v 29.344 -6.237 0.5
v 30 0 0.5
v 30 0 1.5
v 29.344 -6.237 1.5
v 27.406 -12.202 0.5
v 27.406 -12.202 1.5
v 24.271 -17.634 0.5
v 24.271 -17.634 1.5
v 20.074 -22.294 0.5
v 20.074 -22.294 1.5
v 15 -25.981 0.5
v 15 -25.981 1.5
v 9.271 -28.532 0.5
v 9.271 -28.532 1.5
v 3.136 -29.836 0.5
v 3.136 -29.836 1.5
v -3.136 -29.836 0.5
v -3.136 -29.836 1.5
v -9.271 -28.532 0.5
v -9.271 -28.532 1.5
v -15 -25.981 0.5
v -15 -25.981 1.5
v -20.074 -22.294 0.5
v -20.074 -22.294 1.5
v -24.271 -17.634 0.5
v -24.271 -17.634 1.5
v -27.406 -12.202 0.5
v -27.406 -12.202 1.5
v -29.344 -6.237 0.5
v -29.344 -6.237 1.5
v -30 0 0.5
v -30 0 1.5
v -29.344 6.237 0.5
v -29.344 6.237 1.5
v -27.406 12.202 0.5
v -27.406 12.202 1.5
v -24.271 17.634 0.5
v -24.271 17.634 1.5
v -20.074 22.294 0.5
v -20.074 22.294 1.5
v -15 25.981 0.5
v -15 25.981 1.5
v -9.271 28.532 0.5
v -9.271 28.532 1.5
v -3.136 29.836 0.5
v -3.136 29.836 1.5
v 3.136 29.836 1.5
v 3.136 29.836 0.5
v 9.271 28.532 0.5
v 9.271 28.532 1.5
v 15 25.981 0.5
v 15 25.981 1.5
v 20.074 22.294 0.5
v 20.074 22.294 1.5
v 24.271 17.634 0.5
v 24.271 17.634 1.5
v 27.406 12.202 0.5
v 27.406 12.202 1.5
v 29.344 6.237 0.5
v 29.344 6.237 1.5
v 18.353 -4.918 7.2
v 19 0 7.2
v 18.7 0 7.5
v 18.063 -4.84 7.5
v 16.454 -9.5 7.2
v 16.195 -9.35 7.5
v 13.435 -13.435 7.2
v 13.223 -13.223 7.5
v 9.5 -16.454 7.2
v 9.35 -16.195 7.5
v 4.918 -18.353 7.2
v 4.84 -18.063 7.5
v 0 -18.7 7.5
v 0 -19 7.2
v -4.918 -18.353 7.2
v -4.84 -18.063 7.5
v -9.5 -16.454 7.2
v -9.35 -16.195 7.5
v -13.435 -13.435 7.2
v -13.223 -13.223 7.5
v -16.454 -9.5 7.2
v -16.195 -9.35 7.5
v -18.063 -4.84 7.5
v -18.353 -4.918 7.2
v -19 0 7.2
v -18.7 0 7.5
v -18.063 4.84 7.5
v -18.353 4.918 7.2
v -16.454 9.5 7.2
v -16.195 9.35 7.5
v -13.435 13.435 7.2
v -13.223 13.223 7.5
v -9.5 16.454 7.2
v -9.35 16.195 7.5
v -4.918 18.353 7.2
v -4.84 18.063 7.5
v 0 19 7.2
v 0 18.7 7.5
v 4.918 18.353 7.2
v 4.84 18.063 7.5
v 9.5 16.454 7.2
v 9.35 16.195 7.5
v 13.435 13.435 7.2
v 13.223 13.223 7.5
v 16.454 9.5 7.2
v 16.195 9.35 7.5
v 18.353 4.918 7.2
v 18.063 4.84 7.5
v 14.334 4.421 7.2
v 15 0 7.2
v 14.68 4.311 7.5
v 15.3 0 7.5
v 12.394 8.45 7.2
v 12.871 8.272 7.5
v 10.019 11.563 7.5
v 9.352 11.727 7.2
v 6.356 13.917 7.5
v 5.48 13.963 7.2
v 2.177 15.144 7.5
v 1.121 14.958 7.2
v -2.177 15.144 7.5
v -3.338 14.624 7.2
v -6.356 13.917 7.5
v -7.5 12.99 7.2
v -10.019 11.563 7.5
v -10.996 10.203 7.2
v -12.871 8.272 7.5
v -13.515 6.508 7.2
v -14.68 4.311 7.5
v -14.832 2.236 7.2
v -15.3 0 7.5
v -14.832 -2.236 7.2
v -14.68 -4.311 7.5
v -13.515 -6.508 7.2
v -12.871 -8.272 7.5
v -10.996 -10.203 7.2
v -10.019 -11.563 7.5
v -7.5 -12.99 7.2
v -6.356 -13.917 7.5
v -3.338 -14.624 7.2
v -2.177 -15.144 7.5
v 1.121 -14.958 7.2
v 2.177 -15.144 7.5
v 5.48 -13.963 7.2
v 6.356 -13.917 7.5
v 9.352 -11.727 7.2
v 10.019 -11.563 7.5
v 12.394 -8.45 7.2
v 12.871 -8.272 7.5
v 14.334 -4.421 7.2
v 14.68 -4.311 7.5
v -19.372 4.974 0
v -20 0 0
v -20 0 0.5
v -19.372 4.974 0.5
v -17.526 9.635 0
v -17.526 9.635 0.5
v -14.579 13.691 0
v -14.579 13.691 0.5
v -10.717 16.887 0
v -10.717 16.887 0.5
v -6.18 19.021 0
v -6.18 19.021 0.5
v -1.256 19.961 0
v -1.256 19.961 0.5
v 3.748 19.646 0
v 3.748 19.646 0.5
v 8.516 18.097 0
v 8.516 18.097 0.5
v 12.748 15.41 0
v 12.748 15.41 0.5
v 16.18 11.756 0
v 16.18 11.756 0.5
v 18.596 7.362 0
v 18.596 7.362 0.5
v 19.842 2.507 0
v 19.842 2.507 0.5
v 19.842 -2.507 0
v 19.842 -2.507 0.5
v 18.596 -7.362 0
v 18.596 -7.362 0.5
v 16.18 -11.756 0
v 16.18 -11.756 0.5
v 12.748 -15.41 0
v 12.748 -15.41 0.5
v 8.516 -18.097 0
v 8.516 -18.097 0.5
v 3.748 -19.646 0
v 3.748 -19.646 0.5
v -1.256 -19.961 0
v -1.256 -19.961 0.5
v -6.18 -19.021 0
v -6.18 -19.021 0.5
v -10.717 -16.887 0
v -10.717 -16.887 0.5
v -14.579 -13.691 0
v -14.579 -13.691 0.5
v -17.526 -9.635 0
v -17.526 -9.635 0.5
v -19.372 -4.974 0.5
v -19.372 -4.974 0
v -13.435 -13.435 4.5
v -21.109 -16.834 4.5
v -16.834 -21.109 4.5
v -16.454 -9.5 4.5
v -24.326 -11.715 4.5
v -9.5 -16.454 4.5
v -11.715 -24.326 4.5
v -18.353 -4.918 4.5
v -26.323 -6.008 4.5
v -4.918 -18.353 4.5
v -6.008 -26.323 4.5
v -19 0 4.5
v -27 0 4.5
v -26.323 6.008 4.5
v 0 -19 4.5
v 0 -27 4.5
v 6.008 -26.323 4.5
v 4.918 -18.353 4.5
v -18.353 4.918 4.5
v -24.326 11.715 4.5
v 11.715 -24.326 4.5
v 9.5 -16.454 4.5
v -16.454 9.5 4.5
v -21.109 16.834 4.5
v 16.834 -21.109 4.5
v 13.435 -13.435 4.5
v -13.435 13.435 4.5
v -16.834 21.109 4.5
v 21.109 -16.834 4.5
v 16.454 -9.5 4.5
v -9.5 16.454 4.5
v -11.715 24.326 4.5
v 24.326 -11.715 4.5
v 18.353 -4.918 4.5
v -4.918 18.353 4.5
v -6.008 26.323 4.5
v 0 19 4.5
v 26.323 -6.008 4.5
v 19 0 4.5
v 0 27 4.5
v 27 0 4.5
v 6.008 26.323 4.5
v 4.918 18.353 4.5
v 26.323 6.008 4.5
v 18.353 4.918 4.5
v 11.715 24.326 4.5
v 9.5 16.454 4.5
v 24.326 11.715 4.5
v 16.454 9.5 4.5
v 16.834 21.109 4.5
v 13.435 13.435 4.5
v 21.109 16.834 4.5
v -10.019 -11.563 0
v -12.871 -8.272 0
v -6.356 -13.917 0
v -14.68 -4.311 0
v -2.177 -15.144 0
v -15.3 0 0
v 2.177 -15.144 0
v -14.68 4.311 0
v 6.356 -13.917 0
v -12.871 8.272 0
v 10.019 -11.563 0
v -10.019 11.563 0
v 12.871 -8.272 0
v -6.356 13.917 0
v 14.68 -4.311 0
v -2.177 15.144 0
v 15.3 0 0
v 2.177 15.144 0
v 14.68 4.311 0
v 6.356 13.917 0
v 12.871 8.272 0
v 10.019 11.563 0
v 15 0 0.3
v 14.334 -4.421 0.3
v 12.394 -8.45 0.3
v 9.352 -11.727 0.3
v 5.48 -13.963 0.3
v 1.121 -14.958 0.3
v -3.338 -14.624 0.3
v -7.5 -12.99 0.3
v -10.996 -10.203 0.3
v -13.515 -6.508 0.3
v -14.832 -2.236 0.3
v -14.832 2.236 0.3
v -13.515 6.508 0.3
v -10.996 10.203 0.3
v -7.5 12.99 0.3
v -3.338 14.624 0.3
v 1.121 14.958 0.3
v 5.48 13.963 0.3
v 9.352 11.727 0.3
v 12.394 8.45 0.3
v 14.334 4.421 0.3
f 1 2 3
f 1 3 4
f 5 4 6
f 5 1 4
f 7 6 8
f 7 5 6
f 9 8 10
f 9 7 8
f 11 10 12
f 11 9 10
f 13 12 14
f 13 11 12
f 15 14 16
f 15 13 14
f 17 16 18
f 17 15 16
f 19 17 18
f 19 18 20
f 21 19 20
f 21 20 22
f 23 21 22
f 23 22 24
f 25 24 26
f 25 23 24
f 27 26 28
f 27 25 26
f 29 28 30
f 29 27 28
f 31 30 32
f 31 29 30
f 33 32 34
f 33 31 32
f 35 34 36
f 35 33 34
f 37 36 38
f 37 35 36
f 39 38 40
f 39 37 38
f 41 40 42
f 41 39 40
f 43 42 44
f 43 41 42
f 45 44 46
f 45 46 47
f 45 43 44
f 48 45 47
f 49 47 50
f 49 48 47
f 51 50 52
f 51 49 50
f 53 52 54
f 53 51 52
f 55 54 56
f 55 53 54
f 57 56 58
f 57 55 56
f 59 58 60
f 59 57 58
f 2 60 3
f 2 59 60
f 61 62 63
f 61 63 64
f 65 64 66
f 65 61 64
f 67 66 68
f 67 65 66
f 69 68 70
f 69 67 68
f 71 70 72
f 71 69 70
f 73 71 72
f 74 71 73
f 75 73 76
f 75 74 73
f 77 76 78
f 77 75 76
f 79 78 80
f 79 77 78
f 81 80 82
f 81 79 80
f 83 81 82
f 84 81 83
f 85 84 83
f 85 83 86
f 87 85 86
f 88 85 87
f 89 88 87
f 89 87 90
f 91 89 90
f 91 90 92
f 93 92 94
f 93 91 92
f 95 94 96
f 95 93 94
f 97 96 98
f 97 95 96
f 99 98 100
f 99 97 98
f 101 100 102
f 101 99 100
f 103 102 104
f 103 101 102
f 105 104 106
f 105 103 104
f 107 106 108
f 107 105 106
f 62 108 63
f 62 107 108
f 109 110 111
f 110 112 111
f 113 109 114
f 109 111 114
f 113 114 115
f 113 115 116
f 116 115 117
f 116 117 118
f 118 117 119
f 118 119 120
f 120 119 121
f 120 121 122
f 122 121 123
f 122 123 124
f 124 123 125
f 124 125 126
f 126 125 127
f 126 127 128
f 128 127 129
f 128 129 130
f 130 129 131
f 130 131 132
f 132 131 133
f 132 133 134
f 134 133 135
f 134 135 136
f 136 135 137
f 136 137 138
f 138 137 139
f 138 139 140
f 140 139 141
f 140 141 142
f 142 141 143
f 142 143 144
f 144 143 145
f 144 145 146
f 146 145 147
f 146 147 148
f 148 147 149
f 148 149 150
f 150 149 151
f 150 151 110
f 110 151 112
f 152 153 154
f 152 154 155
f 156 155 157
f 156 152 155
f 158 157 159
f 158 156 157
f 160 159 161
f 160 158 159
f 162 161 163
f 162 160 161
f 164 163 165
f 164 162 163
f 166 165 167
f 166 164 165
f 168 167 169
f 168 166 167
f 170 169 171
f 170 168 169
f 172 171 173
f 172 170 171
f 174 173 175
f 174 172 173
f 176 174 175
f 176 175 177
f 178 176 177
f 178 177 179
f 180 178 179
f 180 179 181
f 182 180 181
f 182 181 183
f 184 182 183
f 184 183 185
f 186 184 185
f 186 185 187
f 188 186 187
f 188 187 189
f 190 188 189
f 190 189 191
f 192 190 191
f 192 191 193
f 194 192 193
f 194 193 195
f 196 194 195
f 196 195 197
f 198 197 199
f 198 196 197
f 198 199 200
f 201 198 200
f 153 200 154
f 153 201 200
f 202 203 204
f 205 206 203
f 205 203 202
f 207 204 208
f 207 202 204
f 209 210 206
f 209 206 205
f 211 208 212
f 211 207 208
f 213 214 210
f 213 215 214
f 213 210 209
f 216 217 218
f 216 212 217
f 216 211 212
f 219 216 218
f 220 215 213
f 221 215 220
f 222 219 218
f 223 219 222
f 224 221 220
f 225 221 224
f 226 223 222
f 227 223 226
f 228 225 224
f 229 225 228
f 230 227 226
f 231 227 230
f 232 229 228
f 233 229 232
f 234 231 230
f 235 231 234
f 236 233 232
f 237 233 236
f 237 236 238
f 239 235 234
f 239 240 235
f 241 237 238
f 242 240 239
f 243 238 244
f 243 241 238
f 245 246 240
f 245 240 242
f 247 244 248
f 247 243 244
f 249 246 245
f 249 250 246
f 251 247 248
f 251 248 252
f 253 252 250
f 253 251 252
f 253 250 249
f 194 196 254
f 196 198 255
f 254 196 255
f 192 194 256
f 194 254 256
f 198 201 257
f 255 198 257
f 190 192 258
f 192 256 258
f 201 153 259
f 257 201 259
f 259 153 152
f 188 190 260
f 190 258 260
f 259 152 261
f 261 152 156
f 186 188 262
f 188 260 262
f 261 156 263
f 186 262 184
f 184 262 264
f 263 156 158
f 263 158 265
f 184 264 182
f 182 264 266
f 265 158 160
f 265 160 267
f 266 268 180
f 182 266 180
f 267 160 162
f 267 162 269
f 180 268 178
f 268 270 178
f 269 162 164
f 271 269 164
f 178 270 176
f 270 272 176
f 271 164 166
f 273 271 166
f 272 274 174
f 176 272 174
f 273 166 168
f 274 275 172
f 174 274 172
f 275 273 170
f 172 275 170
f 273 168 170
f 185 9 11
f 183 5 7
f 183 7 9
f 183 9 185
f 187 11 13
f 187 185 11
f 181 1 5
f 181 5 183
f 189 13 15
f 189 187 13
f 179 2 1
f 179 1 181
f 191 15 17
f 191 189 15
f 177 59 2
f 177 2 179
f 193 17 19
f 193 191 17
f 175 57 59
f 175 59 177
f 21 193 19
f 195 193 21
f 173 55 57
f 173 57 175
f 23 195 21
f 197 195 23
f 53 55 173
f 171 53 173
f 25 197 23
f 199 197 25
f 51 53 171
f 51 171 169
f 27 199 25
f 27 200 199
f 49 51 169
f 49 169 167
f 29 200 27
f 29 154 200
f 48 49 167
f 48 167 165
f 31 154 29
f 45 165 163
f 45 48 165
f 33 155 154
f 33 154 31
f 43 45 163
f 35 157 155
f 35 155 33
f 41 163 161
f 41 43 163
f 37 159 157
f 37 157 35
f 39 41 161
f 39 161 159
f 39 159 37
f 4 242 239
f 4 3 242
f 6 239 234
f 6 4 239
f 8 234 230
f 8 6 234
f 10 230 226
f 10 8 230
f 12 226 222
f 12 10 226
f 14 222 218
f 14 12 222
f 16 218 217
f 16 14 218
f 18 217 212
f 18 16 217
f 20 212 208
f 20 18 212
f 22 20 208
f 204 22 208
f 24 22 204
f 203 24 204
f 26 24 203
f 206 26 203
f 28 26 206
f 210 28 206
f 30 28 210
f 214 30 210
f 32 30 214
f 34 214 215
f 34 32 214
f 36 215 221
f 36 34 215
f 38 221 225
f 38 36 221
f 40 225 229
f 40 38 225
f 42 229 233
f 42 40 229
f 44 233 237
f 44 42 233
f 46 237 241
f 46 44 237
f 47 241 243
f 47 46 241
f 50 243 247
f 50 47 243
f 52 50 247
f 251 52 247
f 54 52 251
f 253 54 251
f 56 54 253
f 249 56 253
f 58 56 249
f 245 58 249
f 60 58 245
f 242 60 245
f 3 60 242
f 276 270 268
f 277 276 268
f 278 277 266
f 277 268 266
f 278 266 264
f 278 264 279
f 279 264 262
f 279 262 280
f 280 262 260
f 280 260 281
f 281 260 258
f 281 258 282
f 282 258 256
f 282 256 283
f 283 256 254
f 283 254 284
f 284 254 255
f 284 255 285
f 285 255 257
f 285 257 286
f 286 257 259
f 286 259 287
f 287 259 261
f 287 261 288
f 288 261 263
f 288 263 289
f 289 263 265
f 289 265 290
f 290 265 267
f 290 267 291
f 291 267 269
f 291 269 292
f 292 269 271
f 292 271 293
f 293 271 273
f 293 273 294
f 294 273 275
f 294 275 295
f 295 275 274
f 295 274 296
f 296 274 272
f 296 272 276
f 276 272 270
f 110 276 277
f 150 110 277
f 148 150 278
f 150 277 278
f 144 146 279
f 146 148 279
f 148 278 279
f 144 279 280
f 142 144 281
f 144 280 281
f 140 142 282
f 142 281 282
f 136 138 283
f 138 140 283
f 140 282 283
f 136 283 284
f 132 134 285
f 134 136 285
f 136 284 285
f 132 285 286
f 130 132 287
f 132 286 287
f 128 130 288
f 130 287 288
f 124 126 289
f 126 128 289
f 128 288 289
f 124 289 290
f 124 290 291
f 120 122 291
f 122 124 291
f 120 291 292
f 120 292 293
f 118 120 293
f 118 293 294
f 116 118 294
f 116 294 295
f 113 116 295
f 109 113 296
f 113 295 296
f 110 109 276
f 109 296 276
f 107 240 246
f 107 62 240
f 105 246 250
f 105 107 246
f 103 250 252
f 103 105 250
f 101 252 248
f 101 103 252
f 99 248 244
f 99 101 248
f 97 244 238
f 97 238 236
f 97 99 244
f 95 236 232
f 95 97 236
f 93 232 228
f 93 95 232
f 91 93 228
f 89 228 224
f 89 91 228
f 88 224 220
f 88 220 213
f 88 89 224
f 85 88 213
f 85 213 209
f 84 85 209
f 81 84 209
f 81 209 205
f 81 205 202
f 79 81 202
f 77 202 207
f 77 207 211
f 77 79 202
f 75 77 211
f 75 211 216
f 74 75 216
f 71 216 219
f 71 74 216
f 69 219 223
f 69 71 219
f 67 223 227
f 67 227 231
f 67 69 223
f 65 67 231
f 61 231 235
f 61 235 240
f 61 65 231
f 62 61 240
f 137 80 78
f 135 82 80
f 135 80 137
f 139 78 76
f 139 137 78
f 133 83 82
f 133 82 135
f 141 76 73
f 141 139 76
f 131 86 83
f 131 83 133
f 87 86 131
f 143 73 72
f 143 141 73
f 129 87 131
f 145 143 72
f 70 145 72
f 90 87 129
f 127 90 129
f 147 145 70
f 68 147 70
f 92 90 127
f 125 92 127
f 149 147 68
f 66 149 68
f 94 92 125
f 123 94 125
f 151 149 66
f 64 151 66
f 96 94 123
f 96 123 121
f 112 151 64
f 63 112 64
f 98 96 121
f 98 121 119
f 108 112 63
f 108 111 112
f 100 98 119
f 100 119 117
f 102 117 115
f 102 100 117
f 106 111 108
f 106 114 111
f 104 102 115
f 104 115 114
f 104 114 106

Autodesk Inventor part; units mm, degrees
ref_plane "YZ Plane" through (0, 0, 0) normal (1, 0, 0) x (0, 1, 0)
ref_plane "XZ Plane" through (0, 0, 0) normal (0, 1, 0) x (-1, 0, 0)
ref_plane "XY Plane" through (0, 0, 0) normal (0, 0, 1) x (1, 0, 0)
sketch "草圖1" plane through (0, 0, 0) normal (0, 0, 1) x (1, 0, 0)
  circle A0 centre (0, 0) radius 30
  circle A1 centre (0, 0) radius 15
  dimension "d0" = 60
  dimension "d1" = 30
extrude "擠出1" add sketch "草圖1" along normal blind 7.5
sketch "草圖2" plane through (0, 0, 0) normal (0, 0, -1) x (-1, 0, 0)
  circle A0 centre (0, 0) radius 20
  circle A1 centre (0, 0) radius 34.9484
  dimension "d4" = 40
extrude "擠出2" cut sketch "草圖2" against normal blind 0.5
sketch "草圖3" plane through (0, 0, 7.5) normal (0, 0, 1) x (1, 0, 0)
  circle A0 centre (0, 0) radius 19
  circle A1 centre (0, 0) radius 30.8877
  dimension "d7" = 38
extrude "擠出3" cut sketch "草圖3" against normal blind 3
chamfer "倒角1" distance 3 angle 45 1 edges at (-30, 0, 4.5)
chamfer "倒角2" distance 0.3 angle 45 2 edges at (-15, 0, 7.5) (-19, 0, 7.5)
chamfer "倒角3" distance 0.3 angle 45 1 edges at (-15, 0, 0)
properties part number "KMB601機械油封墊片(T=7.5-外徑60)"
